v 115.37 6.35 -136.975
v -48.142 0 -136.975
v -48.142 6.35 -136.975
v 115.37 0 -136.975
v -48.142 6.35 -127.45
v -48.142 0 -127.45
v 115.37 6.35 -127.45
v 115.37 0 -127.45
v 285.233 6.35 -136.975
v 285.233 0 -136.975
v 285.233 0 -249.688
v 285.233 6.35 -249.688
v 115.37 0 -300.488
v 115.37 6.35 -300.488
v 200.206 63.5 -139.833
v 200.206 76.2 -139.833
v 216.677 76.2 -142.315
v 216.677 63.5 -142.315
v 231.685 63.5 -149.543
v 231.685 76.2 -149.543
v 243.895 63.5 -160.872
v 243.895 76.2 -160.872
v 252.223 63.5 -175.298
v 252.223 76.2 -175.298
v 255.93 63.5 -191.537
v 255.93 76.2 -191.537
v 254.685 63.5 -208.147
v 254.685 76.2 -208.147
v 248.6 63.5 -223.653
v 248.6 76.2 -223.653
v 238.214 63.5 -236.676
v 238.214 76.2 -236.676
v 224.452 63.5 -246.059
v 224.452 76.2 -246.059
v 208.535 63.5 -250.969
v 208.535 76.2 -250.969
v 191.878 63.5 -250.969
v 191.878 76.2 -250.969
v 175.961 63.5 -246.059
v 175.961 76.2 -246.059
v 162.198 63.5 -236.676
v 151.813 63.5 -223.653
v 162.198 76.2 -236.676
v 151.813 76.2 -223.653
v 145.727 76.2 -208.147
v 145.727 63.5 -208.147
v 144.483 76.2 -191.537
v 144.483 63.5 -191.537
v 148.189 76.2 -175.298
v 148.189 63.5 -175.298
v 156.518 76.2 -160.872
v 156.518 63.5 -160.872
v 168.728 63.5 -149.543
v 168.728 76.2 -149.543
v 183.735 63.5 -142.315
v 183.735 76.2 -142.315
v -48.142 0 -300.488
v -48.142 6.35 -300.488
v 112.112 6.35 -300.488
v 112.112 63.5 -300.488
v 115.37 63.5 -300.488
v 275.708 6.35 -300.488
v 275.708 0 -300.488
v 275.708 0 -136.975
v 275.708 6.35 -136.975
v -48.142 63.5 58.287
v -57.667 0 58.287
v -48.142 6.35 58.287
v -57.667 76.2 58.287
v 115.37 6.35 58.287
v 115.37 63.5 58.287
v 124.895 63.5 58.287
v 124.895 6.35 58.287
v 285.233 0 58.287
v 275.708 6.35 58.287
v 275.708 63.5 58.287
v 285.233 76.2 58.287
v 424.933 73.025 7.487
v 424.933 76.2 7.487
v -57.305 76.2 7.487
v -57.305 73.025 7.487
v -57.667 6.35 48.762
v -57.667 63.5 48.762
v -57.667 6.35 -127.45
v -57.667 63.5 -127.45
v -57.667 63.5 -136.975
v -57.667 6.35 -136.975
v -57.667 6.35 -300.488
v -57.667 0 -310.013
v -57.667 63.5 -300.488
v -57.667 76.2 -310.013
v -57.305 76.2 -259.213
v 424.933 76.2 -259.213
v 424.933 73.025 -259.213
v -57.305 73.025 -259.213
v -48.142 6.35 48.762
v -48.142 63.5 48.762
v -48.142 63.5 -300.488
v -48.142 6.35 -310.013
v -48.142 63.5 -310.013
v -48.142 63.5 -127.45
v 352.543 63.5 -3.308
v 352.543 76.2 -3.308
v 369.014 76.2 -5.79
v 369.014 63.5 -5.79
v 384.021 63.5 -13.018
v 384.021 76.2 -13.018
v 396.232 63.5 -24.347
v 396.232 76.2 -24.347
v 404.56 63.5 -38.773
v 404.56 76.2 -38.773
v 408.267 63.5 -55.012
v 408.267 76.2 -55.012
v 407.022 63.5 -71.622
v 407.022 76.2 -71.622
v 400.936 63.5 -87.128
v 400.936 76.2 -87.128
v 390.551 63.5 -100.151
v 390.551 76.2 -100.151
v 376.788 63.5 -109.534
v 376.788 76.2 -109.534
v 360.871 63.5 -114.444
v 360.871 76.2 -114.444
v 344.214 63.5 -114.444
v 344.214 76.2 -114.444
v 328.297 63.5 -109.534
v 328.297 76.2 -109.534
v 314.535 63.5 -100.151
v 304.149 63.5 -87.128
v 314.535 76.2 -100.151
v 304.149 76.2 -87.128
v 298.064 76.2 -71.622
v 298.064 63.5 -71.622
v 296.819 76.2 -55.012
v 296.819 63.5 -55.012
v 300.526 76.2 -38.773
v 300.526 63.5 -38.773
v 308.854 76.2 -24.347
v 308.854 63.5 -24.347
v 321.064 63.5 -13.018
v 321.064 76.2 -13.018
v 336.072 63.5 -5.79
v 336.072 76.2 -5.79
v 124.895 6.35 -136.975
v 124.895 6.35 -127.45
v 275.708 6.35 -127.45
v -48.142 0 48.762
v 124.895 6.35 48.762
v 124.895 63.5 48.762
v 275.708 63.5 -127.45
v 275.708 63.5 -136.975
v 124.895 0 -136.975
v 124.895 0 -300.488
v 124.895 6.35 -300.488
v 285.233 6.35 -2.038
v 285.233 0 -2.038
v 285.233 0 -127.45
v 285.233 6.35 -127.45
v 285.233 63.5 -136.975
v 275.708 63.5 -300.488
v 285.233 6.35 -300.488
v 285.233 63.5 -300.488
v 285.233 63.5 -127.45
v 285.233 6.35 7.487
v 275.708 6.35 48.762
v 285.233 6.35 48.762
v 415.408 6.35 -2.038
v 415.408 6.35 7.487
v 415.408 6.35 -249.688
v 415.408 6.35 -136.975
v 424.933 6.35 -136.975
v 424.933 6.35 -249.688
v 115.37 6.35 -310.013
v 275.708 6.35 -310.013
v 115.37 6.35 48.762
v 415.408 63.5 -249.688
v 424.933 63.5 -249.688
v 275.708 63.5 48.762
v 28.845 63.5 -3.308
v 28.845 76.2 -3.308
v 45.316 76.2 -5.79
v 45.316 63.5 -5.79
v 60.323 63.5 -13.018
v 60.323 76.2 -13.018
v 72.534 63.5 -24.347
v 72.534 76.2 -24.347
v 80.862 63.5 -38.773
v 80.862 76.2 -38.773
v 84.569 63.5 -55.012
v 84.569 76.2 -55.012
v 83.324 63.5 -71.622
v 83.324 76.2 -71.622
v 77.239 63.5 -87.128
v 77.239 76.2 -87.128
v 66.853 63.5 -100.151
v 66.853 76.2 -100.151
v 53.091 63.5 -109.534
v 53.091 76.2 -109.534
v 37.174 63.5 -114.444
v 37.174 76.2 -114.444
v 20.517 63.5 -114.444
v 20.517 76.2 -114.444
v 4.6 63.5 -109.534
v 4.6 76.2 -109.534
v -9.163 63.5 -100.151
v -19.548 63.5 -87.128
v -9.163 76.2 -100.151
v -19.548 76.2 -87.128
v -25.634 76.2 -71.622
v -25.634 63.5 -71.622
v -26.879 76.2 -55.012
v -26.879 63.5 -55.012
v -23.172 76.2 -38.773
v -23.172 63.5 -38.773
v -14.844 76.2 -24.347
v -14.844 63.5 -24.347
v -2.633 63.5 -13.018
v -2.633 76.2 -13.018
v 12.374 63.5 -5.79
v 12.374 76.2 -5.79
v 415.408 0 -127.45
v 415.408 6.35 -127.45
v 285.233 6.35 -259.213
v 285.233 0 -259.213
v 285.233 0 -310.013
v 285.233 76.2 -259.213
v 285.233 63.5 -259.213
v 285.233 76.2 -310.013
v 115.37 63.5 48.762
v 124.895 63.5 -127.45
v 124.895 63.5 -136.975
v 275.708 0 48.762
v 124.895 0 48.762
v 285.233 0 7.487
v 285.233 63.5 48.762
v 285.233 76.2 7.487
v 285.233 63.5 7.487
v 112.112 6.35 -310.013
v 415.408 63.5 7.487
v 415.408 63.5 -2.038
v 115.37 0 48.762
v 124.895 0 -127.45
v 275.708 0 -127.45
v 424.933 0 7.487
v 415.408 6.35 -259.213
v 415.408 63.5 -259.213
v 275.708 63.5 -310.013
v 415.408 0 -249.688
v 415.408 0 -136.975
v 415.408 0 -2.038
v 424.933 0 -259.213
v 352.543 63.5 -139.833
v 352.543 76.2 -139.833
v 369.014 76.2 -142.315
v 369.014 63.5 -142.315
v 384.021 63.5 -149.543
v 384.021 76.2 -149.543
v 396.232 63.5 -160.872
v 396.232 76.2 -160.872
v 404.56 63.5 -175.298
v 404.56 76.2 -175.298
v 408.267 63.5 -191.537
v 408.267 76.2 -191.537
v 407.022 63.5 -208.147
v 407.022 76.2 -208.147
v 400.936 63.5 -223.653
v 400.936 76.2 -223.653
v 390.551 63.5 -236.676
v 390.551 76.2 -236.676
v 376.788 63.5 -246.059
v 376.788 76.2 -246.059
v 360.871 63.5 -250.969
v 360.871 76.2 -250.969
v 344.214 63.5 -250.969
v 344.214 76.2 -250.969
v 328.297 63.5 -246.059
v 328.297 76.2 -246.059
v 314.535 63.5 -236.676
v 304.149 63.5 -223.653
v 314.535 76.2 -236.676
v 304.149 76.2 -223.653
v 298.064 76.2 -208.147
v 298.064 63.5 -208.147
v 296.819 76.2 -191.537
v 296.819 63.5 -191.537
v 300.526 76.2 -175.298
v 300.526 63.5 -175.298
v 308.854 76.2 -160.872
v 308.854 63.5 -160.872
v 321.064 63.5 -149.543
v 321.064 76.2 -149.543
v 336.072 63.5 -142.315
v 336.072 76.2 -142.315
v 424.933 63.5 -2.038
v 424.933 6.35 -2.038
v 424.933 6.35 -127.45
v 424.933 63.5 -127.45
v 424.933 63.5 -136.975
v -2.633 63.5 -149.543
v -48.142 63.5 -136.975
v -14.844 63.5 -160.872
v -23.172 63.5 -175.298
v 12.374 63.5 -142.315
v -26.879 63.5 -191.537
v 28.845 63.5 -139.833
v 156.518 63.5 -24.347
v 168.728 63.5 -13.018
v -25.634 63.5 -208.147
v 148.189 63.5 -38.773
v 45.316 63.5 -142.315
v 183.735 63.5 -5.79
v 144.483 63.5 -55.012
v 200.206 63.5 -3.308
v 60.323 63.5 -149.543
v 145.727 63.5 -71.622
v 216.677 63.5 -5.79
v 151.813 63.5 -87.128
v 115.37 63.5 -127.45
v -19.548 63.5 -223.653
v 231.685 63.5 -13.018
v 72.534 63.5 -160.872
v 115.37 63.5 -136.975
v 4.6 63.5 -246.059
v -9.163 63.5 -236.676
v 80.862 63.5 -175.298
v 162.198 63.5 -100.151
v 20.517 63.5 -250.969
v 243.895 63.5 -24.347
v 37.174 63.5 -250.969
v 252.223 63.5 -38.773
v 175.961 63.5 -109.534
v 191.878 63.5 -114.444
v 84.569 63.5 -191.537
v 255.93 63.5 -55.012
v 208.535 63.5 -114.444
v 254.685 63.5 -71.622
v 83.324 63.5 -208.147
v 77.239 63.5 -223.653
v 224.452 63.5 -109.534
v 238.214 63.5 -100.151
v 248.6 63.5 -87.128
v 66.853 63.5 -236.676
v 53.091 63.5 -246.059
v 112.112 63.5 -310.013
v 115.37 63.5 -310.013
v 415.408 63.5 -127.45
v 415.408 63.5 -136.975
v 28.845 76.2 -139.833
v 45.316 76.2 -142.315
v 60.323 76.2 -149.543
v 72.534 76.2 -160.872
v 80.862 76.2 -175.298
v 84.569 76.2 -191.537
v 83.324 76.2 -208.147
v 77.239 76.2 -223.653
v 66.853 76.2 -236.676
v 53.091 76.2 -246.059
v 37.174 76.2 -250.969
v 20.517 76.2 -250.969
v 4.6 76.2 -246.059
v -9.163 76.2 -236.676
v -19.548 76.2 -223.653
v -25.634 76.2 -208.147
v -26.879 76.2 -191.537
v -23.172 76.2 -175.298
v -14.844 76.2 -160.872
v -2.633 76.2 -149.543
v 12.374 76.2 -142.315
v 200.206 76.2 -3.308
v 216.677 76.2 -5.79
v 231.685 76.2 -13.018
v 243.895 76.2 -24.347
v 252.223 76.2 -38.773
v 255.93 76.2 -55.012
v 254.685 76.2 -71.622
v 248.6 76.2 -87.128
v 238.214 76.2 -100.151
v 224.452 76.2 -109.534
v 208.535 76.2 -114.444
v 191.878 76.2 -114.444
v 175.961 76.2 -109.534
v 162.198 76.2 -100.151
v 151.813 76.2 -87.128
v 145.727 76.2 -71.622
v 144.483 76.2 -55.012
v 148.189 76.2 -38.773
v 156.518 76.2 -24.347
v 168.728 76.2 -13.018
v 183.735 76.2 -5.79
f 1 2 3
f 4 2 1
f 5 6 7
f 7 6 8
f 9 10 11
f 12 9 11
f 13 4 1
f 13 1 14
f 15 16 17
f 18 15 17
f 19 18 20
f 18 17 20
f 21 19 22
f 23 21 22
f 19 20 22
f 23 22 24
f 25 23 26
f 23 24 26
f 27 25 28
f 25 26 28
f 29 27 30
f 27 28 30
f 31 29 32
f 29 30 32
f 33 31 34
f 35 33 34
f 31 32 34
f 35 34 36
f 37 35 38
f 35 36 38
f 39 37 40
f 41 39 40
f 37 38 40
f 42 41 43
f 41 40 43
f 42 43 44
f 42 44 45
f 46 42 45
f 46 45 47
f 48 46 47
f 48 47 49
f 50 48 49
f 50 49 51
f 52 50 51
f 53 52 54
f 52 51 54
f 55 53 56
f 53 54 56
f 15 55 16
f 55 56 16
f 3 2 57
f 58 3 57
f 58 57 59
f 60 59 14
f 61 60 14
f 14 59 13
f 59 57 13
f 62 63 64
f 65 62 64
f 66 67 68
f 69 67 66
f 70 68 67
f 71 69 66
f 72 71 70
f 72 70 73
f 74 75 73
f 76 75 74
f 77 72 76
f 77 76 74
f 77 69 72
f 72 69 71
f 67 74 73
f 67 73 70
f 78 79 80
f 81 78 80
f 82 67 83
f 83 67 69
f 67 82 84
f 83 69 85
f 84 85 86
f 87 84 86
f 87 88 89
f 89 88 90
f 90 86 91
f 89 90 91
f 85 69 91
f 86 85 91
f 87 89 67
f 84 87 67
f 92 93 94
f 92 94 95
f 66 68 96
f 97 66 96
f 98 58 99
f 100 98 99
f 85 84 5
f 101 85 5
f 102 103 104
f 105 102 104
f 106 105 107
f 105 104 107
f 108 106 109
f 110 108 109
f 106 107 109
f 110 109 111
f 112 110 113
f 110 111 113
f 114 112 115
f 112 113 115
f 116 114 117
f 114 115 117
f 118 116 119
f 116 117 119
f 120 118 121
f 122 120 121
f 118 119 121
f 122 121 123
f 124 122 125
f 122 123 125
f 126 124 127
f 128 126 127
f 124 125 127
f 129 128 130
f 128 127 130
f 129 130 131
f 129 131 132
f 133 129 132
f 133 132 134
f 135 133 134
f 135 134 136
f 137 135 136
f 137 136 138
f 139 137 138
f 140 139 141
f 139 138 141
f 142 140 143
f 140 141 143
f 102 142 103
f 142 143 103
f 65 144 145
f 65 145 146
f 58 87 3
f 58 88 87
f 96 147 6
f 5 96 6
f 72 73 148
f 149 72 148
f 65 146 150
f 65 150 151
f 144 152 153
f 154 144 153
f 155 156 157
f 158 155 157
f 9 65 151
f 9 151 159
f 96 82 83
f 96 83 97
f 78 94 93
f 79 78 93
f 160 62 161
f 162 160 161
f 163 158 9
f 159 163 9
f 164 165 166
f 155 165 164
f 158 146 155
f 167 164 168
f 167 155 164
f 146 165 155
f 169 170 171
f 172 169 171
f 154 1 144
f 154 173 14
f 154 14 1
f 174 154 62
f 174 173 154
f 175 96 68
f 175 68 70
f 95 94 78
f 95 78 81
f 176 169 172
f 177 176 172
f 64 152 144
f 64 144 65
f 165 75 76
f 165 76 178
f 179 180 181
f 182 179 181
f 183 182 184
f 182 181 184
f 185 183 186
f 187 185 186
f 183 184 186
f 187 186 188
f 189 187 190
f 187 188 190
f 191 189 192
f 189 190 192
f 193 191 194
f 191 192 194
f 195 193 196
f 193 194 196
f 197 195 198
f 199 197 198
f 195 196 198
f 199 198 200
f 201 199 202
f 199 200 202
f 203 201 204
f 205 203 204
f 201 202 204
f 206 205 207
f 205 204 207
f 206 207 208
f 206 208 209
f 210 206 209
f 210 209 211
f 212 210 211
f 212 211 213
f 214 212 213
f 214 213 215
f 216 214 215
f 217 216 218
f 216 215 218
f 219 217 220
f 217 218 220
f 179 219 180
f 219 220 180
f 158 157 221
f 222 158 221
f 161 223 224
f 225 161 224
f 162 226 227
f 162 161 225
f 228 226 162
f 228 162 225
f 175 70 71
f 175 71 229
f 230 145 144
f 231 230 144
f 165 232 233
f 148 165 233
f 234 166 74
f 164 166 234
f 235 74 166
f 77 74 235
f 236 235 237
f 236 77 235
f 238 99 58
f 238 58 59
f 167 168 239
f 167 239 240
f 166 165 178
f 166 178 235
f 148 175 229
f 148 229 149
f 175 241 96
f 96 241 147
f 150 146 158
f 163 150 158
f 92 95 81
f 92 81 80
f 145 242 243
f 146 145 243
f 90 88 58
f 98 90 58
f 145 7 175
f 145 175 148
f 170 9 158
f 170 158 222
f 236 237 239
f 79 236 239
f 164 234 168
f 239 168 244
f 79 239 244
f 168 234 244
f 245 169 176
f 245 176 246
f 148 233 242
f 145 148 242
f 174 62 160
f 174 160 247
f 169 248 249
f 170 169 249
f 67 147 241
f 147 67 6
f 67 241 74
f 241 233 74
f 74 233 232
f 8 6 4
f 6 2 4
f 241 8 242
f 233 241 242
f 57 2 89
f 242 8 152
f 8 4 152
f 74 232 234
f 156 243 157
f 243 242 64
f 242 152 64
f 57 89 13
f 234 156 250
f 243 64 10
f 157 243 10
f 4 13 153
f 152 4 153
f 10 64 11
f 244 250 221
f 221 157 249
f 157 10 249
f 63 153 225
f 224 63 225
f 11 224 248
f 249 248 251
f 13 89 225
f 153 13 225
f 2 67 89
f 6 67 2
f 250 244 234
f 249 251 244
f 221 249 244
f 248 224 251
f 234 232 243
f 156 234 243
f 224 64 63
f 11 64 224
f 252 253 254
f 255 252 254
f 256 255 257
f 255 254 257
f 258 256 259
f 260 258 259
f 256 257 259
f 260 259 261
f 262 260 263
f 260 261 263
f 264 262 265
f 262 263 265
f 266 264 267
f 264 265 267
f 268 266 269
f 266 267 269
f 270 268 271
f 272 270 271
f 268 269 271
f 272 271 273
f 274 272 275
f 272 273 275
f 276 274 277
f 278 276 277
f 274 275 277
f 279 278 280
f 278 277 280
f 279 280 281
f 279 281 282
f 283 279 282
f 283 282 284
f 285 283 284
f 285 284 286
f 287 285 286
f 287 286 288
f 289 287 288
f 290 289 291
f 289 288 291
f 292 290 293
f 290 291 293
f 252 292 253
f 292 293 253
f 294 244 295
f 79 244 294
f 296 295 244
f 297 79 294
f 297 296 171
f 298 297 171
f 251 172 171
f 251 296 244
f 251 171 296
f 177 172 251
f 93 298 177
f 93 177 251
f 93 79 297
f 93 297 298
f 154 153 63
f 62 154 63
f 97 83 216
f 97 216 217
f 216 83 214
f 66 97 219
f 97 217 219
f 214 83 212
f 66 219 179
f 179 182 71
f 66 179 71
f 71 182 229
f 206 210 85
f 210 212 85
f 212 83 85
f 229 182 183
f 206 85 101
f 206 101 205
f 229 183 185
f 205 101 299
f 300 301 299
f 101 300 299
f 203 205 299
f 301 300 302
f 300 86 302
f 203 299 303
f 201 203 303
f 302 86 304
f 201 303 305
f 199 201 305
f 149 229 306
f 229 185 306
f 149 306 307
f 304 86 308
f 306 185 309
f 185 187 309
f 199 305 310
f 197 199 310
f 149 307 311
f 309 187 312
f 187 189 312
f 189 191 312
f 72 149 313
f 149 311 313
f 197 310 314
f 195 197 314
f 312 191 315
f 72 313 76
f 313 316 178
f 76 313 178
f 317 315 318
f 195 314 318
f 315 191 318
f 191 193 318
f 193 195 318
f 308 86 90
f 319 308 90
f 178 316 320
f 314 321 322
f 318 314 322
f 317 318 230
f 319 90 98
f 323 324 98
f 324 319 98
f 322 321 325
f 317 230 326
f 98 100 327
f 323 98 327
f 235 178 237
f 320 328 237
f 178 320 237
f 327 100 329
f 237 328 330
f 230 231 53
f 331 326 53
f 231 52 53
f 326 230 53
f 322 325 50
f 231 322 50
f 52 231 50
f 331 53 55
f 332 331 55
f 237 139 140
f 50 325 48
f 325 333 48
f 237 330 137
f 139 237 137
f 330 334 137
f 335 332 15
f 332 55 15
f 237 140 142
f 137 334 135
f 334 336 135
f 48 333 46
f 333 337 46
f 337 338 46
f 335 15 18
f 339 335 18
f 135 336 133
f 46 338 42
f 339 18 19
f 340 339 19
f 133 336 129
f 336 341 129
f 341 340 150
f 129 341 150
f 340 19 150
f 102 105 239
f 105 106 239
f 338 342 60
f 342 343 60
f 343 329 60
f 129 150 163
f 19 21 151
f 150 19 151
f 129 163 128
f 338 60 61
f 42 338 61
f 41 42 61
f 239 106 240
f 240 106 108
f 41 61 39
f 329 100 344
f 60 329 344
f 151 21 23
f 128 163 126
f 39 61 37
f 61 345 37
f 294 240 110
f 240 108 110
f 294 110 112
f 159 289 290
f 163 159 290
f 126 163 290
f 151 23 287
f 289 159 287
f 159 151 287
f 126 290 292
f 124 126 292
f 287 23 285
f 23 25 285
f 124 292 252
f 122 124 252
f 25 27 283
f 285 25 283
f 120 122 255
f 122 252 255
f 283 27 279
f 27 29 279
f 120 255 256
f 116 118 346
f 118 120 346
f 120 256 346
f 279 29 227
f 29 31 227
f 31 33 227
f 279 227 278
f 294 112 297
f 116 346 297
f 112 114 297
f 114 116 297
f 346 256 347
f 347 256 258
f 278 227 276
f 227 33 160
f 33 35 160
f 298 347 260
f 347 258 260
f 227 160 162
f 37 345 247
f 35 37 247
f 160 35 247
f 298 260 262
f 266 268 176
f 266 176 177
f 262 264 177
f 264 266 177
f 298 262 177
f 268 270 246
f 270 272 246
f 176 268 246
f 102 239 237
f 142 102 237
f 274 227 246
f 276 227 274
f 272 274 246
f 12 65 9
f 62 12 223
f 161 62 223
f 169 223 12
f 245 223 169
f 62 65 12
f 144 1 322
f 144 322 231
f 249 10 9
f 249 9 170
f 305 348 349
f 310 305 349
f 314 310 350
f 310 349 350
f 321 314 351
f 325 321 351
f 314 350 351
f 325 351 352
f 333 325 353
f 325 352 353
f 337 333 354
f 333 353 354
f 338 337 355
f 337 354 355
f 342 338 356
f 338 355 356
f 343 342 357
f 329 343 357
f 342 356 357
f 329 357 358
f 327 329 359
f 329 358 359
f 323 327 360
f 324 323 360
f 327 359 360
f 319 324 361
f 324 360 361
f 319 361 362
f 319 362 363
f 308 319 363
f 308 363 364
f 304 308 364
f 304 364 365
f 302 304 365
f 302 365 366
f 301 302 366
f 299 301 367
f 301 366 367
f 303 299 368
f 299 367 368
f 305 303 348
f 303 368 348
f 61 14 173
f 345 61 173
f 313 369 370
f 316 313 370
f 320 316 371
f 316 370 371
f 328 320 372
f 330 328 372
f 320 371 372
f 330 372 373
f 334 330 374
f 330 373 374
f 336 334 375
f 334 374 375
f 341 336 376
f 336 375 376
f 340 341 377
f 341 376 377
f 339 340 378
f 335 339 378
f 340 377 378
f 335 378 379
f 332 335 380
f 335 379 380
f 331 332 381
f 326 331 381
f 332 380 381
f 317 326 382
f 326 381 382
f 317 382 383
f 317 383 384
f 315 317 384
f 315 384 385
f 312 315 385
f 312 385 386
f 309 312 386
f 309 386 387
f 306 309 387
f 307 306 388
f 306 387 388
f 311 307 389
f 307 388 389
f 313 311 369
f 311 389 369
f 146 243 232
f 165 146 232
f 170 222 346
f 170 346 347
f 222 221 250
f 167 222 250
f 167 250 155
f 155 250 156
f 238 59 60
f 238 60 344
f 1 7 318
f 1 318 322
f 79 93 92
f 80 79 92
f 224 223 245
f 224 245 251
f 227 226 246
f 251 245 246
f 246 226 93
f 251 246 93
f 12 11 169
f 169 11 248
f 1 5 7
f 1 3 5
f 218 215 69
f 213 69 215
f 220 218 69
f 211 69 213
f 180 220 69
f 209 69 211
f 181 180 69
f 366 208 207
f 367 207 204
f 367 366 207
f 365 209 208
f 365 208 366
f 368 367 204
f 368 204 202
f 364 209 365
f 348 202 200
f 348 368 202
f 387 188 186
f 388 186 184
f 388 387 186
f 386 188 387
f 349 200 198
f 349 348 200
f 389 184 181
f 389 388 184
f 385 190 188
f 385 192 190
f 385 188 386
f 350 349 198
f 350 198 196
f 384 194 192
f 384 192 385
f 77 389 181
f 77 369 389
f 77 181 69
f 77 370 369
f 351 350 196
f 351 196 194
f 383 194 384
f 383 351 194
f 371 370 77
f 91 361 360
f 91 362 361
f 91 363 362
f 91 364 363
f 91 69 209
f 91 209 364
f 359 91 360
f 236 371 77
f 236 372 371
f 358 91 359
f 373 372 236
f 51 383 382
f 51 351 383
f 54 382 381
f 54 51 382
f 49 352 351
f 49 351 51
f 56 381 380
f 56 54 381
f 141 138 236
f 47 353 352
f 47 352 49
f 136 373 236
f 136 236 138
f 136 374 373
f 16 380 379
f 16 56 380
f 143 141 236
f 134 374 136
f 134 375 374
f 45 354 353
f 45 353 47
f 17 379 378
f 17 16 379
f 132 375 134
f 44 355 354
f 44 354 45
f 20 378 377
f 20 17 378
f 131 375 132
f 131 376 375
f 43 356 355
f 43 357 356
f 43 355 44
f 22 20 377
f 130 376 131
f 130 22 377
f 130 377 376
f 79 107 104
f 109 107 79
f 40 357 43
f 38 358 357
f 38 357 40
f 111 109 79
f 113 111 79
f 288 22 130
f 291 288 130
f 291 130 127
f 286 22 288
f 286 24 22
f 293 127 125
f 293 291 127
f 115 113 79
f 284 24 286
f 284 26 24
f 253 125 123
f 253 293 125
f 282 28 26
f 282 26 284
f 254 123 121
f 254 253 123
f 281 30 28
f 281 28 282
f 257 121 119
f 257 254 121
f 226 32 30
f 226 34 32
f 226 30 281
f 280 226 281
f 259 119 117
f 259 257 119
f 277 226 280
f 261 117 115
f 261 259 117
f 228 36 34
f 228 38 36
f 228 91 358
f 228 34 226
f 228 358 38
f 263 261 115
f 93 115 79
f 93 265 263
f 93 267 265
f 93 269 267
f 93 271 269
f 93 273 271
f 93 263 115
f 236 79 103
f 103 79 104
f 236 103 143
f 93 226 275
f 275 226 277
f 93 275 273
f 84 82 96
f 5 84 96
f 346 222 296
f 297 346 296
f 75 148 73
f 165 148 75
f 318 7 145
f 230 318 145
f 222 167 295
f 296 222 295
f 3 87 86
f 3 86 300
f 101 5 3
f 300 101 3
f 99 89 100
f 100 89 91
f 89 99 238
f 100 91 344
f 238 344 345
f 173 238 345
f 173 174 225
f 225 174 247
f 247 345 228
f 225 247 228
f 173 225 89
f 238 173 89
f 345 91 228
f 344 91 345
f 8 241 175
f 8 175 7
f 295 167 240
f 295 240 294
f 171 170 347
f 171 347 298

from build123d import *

# Parameters (mm, degrees)
SKETCH1_W           = 150.8125
SKETCH1_H           = 163.5125
SKETCH1_W_2         = 130.175
SKETCH1_H_2         = 125.4125
SKETCH1_H_3         = 112.7125
SKETCH1_W_3         = 163.5125
SKETCH1_H_4         = 176.2125
BOSS_EXTRUDE1_DEPTH = 6.35
SKETCH2_W           = 9.525
SKETCH2_H           = 9.525
SKETCH2_W_2         = 3.2584612
BOSS_EXTRUDE2_DEPTH = 69.85
SKETCH3_R           = 55.88
BOSS_EXTRUDE3_DEPTH = 12.7
SKETCH4_W           = 482.237345922
SKETCH4_H           = 3.175
BOSS_EXTRUDE4_DEPTH = 266.7


with BuildPart() as part:
    # Sketch1 → Boss-Extrude1 (new body)
    with BuildSketch(Plane(origin=(0, 0, 0), x_dir=(1, 0, 0), z_dir=(0, 1, 0))):
        Polygon((285.232758897, 259.212857244), (285.232758897, 310.012857244), (-57.667241103, 310.012857244), (-57.667241103, -58.287142756), (285.232758897, -58.287142756), (285.232758897, -7.487142756), (424.932758897, -7.487142756), (424.932758897, 259.212857244), align=None)
        with Locations((200.301508897, 218.731607244)):
            Rectangle(SKETCH1_W, SKETCH1_H, mode=Mode.SUBTRACT)
        with Locations((350.320258897, 64.744107244)):
            Rectangle(SKETCH1_W_2, SKETCH1_H_2, mode=Mode.SUBTRACT)
        with Locations((350.320258897, 193.331607244)):
            Rectangle(SKETCH1_W_2, SKETCH1_H_3, mode=Mode.SUBTRACT)
        with Locations((33.614008897, 218.731607244)):
            Rectangle(SKETCH1_W_3, SKETCH1_H, mode=Mode.SUBTRACT)
        with Locations((33.614008897, 39.344107244)):
            Rectangle(SKETCH1_W_3, SKETCH1_H_4, mode=Mode.SUBTRACT)
        with Locations((200.301508897, 39.344107244)):
            Rectangle(SKETCH1_W, SKETCH1_H_4, mode=Mode.SUBTRACT)
    extrude(amount=BOSS_EXTRUDE1_DEPTH)

    # Sketch2 → Boss-Extrude2 (add)
    with BuildSketch(Plane(origin=(0, 6.35, 0), x_dir=(1, 0, 0), z_dir=(0, 1, 0))):
        with Locations((-52.904741103, 305.250357244)):
            Rectangle(SKETCH2_W, SKETCH2_H)
        with Locations((113.741028297, 305.250357244)):
            Rectangle(SKETCH2_W_2, SKETCH2_H)
        with Locations((120.132758897, 132.212857244)):
            Rectangle(SKETCH2_W, SKETCH2_H)
        with Locations((-52.904741103, 132.212857244)):
            Rectangle(SKETCH2_W, SKETCH2_H)
        with Locations((-52.904741103, -53.524642756)):
            Rectangle(SKETCH2_W, SKETCH2_H)
        with Locations((120.132758897, -53.524642756)):
            Rectangle(SKETCH2_W, SKETCH2_H)
        with Locations((280.470258897, -53.524642756)):
            Rectangle(SKETCH2_W, SKETCH2_H)
        with Locations((280.470258897, 132.212857244)):
            Rectangle(SKETCH2_W, SKETCH2_H)
        with Locations((280.470258897, 305.250357244)):
            Rectangle(SKETCH2_W, SKETCH2_H)
        with Locations((420.170258897, 254.450357244)):
            Rectangle(SKETCH2_W, SKETCH2_H)
        with Locations((420.170258897, -2.724642756)):
            Rectangle(SKETCH2_W, SKETCH2_H)
        with Locations((420.170258897, 132.212857244)):
            Rectangle(SKETCH2_W, SKETCH2_H)
    extrude(amount=BOSS_EXTRUDE2_DEPTH)

    # Sketch3 → Boss-Extrude3 (add)
    with BuildSketch(Plane(origin=(0, 76.2, 0), x_dir=(1, 0, 0), z_dir=(0, 1, 0))):
        Polygon((115.370258897, -58.287142756), (115.370258897, -48.762142756), (124.895258897, -48.762142756), (124.895258897, -58.287142756), (285.232758897, -58.287142756), (285.232758897, -7.487142756), (424.932758897, -7.487142756), (424.932758897, 259.212857244), (285.232758897, 259.212857244), (285.232758897, 310.012857244), (-57.667241103, 310.012857244), (-57.667241103, -58.287142756), align=None)
        with Locations((28.845158897, 59.187857244)):
            Circle(SKETCH3_R, mode=Mode.SUBTRACT)
        with Locations((28.845158897, 195.712857244)):
            Circle(SKETCH3_R, mode=Mode.SUBTRACT)
        with Locations((200.206258897, 59.187857244)):
            Circle(SKETCH3_R, mode=Mode.SUBTRACT)
        with Locations((200.206258897, 195.712857244)):
            Circle(SKETCH3_R, mode=Mode.SUBTRACT)
        with Locations((352.542758897, 59.187857244)):
            Circle(SKETCH3_R, mode=Mode.SUBTRACT)
        with Locations((352.542758897, 195.712857244)):
            Circle(SKETCH3_R, mode=Mode.SUBTRACT)
    extrude(amount=-BOSS_EXTRUDE3_DEPTH)


with BuildPart() as body_2:
    # Sketch4 → Boss-Extrude4 (new body)
    with BuildSketch(Plane(origin=(0, 0, -259.212857244), x_dir=(-1, 0, 0), z_dir=(0, 0, -1))):
        with Locations((-183.814085936, 74.6125)):
            Rectangle(SKETCH4_W, SKETCH4_H)
    extrude(amount=-BOSS_EXTRUDE4_DEPTH)


solid = Compound([part.part, body_2.part])
